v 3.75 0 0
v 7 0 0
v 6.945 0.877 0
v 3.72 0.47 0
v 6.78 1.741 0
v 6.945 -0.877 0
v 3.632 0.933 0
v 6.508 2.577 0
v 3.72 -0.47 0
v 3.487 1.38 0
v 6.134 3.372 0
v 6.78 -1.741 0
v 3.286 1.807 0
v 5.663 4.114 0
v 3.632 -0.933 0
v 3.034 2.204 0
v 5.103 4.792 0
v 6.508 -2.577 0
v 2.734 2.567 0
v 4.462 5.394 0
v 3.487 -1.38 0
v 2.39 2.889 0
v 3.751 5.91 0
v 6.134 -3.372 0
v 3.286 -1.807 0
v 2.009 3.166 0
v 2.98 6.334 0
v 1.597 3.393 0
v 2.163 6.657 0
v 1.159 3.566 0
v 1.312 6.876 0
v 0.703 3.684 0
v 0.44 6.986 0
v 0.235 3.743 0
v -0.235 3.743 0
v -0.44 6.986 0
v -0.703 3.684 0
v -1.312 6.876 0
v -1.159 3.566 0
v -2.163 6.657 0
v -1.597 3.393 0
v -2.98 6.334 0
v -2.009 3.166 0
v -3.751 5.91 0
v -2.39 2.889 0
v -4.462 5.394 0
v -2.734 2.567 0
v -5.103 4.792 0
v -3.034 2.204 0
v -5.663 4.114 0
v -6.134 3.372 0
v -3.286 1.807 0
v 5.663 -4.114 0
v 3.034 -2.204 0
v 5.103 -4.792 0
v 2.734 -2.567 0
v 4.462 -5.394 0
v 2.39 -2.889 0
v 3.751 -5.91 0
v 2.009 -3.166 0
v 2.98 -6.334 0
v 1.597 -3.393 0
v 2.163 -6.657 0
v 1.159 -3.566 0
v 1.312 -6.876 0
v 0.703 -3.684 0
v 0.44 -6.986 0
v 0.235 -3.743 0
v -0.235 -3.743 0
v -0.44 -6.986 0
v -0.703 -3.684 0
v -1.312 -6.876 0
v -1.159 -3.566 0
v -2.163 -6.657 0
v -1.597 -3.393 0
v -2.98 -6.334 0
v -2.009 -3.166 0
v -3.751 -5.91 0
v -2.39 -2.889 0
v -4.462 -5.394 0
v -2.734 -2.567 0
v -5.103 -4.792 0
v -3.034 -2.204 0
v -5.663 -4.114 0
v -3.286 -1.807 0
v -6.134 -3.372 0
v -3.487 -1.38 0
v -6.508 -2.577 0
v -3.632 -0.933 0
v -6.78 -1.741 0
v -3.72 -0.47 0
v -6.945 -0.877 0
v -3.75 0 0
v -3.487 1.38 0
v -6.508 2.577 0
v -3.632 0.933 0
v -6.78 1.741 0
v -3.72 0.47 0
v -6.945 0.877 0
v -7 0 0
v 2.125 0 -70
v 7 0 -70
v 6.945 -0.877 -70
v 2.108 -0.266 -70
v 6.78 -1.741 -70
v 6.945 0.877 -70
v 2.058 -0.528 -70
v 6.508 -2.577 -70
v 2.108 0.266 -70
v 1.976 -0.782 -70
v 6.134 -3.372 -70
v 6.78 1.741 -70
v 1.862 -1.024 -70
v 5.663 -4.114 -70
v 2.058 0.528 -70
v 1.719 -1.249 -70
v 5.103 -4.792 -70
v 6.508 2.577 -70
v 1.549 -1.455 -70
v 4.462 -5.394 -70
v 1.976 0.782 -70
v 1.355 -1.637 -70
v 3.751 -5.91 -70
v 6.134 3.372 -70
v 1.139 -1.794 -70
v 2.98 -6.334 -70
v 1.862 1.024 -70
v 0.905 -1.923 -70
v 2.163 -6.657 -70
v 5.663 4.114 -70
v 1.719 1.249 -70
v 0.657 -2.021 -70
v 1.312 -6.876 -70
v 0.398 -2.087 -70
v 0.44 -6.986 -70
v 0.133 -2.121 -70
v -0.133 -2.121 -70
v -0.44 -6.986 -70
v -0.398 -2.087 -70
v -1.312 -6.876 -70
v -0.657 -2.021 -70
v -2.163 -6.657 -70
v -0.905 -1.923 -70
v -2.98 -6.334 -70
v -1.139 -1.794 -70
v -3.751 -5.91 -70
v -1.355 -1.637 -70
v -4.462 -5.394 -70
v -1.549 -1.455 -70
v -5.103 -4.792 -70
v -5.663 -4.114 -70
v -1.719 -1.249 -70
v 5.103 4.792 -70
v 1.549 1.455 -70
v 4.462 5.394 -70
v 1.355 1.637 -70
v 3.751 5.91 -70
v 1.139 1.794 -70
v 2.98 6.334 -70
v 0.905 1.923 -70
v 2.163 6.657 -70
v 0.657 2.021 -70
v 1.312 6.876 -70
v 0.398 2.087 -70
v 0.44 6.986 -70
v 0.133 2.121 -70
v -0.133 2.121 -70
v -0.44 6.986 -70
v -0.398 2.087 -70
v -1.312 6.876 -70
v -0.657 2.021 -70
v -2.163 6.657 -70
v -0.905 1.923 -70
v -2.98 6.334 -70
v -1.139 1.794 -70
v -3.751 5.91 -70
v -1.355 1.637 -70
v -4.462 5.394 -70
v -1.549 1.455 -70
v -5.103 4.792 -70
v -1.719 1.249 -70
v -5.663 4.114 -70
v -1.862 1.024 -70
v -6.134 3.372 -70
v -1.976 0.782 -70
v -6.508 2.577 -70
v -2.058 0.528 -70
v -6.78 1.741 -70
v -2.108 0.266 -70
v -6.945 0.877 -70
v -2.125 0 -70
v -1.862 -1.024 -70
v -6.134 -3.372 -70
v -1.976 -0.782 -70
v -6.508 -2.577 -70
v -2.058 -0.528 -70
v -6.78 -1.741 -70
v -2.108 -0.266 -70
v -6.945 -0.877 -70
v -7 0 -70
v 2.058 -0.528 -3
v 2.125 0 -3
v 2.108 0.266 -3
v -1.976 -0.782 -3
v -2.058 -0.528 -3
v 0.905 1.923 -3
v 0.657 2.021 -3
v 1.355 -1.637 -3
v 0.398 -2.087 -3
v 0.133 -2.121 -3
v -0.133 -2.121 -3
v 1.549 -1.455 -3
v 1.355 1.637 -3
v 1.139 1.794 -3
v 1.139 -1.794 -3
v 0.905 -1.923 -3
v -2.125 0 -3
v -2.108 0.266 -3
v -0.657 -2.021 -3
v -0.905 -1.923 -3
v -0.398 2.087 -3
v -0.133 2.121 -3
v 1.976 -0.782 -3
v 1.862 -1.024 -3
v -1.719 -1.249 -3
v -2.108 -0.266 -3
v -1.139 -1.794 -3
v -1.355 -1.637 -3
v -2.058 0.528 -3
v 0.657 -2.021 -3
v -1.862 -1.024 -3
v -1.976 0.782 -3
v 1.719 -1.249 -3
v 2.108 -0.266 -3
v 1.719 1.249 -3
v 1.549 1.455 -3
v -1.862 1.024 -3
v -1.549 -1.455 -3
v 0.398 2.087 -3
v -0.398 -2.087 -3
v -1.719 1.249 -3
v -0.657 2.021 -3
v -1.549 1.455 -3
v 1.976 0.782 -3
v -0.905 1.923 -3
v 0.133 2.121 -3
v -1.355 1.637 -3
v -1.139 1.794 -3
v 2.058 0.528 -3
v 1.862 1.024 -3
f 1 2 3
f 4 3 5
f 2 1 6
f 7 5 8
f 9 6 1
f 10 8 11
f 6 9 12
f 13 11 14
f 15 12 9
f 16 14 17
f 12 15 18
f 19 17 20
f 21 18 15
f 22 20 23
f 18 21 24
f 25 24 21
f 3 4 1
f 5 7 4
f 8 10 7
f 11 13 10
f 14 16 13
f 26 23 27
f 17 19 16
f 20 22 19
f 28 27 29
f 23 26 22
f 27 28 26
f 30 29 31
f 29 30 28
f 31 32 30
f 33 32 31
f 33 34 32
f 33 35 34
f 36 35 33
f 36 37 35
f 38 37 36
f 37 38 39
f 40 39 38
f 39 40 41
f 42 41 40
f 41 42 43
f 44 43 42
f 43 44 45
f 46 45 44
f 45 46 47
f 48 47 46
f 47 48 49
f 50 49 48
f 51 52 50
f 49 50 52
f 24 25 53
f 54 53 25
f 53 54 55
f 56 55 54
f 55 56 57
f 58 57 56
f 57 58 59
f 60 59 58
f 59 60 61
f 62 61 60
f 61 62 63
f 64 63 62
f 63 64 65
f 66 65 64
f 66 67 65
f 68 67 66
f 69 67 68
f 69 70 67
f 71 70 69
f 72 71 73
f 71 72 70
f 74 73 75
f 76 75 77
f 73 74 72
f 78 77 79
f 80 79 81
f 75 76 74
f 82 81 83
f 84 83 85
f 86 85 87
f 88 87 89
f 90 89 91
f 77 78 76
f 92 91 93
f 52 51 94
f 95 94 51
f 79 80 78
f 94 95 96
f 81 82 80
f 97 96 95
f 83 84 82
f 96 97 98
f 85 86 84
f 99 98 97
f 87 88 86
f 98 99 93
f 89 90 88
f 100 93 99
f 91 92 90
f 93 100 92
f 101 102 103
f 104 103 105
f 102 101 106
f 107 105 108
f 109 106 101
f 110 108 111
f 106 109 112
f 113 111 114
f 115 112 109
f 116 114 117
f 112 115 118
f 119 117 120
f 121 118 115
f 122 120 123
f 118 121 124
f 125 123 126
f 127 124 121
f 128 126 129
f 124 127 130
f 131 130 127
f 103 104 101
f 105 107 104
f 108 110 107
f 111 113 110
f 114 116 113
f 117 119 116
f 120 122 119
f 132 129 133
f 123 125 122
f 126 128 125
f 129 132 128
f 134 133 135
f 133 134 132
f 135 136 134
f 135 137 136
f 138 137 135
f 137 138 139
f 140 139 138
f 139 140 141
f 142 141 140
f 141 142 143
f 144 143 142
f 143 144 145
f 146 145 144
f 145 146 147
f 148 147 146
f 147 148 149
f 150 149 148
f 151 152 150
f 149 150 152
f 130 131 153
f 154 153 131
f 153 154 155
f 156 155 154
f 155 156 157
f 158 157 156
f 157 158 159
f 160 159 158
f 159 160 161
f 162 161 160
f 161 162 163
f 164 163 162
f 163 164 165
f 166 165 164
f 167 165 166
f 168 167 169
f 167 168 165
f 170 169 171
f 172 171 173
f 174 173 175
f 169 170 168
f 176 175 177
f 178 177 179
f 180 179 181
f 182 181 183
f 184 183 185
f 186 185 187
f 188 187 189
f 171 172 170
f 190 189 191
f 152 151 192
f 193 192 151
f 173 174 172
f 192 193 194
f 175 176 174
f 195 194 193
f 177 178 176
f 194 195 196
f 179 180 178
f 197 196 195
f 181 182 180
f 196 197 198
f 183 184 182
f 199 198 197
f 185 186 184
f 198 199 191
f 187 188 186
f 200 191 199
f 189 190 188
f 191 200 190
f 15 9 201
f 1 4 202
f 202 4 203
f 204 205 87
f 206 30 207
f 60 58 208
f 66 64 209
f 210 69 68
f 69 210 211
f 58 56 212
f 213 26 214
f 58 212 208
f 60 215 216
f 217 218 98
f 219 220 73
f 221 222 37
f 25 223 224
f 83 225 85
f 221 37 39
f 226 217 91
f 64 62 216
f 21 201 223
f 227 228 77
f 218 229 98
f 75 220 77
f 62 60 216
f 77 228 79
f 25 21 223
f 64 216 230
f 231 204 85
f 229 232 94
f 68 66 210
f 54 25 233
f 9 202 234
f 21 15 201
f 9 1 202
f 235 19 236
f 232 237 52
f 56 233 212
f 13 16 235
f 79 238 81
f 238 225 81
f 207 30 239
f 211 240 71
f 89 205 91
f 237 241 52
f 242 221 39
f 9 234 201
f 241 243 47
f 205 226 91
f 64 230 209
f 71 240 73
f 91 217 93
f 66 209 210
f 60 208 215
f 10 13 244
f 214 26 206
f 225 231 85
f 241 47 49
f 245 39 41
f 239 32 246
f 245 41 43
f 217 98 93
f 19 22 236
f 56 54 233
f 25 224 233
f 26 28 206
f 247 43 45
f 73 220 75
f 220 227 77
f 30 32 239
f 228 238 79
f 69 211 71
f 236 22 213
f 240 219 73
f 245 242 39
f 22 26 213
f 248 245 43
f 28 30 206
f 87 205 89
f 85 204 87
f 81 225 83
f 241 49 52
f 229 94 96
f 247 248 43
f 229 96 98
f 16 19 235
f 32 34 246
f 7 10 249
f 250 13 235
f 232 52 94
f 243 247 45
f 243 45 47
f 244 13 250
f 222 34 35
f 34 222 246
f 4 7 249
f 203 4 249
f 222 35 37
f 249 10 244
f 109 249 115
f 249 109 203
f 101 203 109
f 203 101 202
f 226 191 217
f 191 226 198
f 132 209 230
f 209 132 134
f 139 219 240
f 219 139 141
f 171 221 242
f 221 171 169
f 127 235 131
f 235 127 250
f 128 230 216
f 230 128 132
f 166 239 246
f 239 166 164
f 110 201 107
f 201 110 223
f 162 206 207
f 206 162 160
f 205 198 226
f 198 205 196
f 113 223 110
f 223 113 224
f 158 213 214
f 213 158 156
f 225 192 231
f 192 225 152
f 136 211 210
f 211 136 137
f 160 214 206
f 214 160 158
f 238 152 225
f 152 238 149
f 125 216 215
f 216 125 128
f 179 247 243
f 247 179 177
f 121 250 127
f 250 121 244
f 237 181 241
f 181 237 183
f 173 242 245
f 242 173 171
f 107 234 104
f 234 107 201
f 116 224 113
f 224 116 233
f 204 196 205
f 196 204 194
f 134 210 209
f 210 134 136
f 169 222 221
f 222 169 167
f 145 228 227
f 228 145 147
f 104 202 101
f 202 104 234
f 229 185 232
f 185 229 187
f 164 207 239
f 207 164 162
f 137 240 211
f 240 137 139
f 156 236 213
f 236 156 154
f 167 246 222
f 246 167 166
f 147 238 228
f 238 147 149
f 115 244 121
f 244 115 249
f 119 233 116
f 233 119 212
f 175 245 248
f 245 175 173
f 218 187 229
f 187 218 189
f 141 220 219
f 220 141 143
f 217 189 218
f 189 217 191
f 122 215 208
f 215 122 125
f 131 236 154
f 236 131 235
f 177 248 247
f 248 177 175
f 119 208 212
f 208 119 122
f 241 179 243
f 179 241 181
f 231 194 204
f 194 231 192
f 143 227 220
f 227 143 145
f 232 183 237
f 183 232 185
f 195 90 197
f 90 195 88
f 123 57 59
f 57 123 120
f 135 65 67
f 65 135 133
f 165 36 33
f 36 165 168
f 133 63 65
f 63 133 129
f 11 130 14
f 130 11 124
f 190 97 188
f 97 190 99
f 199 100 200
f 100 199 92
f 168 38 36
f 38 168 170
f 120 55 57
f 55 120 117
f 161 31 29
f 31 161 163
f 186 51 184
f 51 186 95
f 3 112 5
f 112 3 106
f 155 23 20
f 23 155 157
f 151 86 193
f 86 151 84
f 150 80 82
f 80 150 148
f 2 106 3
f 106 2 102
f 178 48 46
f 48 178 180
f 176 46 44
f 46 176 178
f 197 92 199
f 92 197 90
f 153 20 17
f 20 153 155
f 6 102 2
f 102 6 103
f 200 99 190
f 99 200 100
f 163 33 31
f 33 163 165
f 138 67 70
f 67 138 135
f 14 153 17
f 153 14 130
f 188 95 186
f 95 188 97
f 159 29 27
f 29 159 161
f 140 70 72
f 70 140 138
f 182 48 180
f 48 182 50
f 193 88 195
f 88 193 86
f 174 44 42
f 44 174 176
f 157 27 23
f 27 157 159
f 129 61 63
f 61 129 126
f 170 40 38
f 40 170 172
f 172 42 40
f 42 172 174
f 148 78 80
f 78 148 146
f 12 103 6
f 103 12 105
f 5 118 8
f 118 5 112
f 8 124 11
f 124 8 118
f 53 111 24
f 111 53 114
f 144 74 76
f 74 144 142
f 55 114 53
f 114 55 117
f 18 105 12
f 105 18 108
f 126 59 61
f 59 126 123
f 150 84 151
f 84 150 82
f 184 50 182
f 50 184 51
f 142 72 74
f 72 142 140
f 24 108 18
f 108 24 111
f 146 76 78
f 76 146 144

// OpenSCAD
$fn = 50;


difference() {
	union() {
		translate(v = [0, 0, -70.0000000000]) {
			cylinder(h = 70, r = 7.0000000000);
		}
	}
	union() {
		translate(v = [0, 0, 0]) {
			rotate(a = [0, 0, 0]) {
				difference() {
					union() {
						#translate(v = [0, 0, -70.0000000000]) {
							cylinder(h = 70, r = 2.0000000000);
						}
						#translate(v = [0, 0, -3]) {
							cylinder(h = 3, r1 = 2.1250000000, r2 = 3.7500000000);
						}
						#translate(v = [0, 0, -70.0000000000]) {
							cylinder(h = 70, r = 2.1250000000);
						}
						#translate(v = [0, 0, -70.0000000000]) {
							cylinder(h = 70, r = 2.0000000000);
						}
					}
					union();
				}
			}
		}
	}
}
